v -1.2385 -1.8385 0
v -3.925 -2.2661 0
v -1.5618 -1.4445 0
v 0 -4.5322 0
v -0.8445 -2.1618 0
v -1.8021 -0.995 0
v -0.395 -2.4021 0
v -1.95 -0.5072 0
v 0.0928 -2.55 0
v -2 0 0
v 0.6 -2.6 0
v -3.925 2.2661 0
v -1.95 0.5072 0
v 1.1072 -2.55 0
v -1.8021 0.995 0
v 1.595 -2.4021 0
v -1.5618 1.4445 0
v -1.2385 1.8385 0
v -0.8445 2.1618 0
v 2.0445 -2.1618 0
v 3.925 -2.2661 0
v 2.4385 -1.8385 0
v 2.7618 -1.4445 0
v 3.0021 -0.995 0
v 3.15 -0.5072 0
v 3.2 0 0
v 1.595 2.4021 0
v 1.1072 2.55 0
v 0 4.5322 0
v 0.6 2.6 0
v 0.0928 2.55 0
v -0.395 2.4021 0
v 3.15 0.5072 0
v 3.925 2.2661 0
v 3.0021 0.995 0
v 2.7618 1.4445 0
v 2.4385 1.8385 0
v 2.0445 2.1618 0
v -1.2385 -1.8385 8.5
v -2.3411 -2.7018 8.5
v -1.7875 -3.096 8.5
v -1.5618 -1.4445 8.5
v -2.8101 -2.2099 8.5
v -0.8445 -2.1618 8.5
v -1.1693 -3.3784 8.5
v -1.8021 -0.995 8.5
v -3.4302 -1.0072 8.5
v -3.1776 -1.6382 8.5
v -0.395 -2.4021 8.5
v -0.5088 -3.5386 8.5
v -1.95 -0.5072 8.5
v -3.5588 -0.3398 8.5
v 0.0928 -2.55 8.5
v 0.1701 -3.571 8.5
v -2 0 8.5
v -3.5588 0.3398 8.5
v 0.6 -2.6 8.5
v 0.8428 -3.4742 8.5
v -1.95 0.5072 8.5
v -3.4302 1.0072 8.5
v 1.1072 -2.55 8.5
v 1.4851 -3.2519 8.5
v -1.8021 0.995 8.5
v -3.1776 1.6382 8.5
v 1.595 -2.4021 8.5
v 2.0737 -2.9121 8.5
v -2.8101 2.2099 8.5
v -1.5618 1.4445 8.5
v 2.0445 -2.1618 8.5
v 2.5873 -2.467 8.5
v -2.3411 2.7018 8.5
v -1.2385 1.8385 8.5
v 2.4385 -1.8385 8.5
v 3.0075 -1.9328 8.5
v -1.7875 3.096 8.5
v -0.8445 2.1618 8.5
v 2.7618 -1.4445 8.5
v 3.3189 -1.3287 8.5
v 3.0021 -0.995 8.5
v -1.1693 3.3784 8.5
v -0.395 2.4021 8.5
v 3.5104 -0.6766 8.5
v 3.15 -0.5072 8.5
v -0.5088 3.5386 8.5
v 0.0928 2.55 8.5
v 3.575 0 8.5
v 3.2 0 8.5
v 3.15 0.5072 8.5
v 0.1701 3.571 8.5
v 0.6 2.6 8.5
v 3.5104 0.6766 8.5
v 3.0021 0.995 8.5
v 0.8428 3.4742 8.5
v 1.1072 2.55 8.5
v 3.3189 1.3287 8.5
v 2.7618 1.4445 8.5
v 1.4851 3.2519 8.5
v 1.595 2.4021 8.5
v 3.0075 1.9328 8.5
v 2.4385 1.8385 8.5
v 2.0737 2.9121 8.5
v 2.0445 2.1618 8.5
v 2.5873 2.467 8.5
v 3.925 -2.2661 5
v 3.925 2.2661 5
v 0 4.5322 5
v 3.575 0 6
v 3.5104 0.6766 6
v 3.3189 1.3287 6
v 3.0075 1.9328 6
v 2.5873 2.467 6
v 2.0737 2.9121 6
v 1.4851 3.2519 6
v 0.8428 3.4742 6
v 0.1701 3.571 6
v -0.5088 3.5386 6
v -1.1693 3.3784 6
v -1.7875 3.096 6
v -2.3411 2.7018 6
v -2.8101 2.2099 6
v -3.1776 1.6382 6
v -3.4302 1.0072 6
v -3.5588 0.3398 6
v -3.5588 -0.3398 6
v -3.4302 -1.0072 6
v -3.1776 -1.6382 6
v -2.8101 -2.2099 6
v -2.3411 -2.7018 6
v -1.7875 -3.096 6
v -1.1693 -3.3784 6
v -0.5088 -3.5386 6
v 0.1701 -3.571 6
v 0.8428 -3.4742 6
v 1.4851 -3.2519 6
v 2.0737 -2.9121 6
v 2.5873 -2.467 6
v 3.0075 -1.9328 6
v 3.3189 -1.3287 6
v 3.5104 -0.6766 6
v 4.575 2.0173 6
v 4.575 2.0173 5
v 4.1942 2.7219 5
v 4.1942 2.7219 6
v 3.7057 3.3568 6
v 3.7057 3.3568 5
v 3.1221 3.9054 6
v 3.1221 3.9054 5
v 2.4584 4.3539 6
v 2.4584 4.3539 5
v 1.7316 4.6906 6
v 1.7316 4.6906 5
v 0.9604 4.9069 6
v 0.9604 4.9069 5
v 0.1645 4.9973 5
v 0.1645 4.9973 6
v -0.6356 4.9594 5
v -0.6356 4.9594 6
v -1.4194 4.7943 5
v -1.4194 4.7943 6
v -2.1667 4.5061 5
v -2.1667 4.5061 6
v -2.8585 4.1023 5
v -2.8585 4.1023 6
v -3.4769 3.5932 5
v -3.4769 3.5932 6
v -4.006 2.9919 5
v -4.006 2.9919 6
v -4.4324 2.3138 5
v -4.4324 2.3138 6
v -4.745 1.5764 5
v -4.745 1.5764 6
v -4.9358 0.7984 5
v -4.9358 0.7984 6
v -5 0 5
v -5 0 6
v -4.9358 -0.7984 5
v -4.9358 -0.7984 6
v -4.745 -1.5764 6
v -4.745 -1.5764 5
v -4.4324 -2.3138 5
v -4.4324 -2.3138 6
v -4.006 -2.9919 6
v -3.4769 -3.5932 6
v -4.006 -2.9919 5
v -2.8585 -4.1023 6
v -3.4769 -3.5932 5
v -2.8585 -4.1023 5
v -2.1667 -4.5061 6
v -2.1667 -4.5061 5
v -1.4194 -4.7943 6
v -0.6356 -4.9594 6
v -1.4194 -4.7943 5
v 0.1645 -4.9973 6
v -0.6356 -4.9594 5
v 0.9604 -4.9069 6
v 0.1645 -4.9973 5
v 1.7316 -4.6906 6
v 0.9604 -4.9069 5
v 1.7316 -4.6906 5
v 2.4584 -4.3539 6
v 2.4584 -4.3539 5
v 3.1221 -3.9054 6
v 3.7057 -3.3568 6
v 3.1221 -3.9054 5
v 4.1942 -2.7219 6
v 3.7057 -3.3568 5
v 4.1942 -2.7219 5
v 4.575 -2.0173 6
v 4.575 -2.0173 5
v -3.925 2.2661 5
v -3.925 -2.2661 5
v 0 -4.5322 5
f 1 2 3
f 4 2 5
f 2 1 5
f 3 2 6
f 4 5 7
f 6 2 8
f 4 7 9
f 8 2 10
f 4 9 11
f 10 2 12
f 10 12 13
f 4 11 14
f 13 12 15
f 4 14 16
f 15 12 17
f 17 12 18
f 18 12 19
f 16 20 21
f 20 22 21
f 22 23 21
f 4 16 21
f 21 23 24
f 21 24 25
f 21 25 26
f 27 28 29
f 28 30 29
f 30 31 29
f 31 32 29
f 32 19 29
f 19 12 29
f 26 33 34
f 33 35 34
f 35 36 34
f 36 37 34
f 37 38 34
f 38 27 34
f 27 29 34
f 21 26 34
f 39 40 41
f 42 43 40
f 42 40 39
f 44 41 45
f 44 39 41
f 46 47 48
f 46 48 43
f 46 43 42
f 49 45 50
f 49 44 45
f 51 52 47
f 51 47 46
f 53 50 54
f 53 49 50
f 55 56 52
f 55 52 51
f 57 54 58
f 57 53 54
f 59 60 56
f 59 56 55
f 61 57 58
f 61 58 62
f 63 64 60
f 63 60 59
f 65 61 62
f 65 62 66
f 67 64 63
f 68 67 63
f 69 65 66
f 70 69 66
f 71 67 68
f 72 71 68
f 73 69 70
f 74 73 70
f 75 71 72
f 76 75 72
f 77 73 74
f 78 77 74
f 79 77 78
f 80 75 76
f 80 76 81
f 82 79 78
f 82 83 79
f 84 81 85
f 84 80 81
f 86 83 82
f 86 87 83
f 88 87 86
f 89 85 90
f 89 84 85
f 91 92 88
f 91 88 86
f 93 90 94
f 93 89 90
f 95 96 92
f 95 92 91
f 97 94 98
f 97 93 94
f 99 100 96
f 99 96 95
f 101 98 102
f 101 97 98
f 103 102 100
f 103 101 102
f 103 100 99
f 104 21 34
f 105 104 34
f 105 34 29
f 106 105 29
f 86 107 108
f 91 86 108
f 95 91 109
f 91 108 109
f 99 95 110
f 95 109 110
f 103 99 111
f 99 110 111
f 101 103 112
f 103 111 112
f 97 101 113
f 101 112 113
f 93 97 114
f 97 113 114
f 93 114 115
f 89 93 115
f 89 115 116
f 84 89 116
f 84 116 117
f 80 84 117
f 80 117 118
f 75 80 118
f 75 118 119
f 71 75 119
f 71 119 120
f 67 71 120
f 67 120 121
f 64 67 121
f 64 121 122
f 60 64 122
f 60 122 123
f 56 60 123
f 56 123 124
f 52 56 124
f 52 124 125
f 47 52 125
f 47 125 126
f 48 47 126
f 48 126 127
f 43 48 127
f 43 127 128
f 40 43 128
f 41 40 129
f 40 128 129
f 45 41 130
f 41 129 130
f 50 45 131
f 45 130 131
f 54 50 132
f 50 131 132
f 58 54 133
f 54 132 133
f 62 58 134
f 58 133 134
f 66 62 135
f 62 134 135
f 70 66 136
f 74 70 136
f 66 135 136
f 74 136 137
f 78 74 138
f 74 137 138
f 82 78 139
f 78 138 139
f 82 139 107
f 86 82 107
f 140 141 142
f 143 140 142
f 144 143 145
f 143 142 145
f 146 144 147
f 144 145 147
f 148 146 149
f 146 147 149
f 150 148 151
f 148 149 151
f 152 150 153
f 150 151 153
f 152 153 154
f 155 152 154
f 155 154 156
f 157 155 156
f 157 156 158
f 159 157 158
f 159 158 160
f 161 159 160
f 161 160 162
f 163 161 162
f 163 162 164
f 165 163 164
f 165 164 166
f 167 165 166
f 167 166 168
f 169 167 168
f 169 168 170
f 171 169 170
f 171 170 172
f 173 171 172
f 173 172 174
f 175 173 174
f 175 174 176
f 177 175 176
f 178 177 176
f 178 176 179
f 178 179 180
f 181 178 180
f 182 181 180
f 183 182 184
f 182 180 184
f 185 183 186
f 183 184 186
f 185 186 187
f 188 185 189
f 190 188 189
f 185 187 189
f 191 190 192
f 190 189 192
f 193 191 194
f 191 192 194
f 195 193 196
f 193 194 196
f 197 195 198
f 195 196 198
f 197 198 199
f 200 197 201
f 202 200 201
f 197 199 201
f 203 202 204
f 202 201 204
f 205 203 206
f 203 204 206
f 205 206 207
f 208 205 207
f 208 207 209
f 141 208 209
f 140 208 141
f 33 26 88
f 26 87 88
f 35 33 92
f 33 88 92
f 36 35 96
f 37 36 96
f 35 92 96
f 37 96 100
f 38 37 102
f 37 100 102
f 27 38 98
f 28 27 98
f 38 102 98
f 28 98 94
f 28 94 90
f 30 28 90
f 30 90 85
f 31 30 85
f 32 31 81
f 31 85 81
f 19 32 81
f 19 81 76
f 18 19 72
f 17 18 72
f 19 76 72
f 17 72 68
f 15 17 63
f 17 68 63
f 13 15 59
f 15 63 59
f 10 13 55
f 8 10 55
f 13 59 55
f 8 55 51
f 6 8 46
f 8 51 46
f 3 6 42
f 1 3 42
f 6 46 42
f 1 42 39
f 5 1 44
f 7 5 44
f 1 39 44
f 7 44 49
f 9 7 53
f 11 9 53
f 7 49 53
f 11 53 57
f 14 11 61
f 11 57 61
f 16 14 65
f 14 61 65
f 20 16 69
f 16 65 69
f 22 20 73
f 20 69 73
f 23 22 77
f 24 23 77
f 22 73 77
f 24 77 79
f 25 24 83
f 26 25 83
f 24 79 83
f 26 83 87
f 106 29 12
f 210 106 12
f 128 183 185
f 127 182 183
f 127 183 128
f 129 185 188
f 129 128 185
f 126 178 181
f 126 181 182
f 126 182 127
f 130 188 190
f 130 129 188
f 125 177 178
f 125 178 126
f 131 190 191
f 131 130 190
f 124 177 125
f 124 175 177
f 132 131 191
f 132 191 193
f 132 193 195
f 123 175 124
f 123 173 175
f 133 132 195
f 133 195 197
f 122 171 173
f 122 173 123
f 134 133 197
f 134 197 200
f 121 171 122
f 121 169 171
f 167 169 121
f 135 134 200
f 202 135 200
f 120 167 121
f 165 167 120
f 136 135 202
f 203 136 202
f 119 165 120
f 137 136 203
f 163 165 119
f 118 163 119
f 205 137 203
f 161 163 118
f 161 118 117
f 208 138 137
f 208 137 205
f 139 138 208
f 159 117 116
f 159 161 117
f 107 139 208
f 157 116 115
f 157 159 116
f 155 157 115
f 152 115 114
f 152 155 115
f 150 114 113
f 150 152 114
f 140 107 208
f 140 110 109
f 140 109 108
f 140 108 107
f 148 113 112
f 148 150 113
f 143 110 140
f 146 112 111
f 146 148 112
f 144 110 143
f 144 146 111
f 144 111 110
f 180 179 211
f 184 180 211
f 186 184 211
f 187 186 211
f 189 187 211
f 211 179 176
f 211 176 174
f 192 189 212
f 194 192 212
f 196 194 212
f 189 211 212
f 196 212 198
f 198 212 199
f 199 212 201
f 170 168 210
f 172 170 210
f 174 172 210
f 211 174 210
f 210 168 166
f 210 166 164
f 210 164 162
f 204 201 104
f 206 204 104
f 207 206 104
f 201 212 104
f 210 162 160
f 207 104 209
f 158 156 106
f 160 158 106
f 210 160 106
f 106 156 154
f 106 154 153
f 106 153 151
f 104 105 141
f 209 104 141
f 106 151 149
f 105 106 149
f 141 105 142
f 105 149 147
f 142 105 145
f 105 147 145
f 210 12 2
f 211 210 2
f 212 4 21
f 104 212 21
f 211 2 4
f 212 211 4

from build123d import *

# Parameters (mm, degrees)
F1_DEPTH  = 5
F2_R      = 3.575
F3_DEPTH  = 3.5
F4_R      = 2.6
F5_DEPTH  = 25
F6_R      = 5
F7_DEPTH  = 1
F8_R      = 2.6
F9_DEPTH  = 25
F10_W     = 1.5
F10_H     = 5
F11_DEPTH = 2


with BuildPart() as f1:
    # F0 (on Top) → F1 (new body)
    with BuildSketch(Plane.XY):
        Polygon((3.925, -2.2661), (3.925, 2.2661), (0, 4.5322), (-3.925, 2.2661), (-3.925, -2.2661), (0, -4.5322), align=None)
    extrude(amount=F1_DEPTH)

    # F2 (on face) → F3 (join)
    with BuildSketch(Plane.XY.offset(5)):
        Circle(F2_R)
    extrude(amount=F3_DEPTH)

    # F4 (on face) → F5 (cut)
    with BuildSketch(Plane.XY.offset(8.5)):
        with Locations((0.6, 0)):
            Circle(F4_R)
    extrude(amount=-F5_DEPTH, mode=Mode.SUBTRACT)

    # F6 (on face) → F7 (join)
    with BuildSketch(Plane.XY.offset(5)):
        Circle(F6_R)
    extrude(amount=F7_DEPTH)

    # F8 (on face) → F9 (cut)
    with BuildSketch(Plane.XY.offset(8.5)):
        with Locations((0.6, 0)):
            Circle(F8_R)
    extrude(amount=-F9_DEPTH, mode=Mode.SUBTRACT)

    # F10 (on face) → F11 (cut)
    with BuildSketch(Plane.XY.offset(6)):
        with Locations((5.325, 0)):
            Rectangle(F10_W, F10_H)
    extrude(amount=-F11_DEPTH, mode=Mode.SUBTRACT)


solid = f1.part
